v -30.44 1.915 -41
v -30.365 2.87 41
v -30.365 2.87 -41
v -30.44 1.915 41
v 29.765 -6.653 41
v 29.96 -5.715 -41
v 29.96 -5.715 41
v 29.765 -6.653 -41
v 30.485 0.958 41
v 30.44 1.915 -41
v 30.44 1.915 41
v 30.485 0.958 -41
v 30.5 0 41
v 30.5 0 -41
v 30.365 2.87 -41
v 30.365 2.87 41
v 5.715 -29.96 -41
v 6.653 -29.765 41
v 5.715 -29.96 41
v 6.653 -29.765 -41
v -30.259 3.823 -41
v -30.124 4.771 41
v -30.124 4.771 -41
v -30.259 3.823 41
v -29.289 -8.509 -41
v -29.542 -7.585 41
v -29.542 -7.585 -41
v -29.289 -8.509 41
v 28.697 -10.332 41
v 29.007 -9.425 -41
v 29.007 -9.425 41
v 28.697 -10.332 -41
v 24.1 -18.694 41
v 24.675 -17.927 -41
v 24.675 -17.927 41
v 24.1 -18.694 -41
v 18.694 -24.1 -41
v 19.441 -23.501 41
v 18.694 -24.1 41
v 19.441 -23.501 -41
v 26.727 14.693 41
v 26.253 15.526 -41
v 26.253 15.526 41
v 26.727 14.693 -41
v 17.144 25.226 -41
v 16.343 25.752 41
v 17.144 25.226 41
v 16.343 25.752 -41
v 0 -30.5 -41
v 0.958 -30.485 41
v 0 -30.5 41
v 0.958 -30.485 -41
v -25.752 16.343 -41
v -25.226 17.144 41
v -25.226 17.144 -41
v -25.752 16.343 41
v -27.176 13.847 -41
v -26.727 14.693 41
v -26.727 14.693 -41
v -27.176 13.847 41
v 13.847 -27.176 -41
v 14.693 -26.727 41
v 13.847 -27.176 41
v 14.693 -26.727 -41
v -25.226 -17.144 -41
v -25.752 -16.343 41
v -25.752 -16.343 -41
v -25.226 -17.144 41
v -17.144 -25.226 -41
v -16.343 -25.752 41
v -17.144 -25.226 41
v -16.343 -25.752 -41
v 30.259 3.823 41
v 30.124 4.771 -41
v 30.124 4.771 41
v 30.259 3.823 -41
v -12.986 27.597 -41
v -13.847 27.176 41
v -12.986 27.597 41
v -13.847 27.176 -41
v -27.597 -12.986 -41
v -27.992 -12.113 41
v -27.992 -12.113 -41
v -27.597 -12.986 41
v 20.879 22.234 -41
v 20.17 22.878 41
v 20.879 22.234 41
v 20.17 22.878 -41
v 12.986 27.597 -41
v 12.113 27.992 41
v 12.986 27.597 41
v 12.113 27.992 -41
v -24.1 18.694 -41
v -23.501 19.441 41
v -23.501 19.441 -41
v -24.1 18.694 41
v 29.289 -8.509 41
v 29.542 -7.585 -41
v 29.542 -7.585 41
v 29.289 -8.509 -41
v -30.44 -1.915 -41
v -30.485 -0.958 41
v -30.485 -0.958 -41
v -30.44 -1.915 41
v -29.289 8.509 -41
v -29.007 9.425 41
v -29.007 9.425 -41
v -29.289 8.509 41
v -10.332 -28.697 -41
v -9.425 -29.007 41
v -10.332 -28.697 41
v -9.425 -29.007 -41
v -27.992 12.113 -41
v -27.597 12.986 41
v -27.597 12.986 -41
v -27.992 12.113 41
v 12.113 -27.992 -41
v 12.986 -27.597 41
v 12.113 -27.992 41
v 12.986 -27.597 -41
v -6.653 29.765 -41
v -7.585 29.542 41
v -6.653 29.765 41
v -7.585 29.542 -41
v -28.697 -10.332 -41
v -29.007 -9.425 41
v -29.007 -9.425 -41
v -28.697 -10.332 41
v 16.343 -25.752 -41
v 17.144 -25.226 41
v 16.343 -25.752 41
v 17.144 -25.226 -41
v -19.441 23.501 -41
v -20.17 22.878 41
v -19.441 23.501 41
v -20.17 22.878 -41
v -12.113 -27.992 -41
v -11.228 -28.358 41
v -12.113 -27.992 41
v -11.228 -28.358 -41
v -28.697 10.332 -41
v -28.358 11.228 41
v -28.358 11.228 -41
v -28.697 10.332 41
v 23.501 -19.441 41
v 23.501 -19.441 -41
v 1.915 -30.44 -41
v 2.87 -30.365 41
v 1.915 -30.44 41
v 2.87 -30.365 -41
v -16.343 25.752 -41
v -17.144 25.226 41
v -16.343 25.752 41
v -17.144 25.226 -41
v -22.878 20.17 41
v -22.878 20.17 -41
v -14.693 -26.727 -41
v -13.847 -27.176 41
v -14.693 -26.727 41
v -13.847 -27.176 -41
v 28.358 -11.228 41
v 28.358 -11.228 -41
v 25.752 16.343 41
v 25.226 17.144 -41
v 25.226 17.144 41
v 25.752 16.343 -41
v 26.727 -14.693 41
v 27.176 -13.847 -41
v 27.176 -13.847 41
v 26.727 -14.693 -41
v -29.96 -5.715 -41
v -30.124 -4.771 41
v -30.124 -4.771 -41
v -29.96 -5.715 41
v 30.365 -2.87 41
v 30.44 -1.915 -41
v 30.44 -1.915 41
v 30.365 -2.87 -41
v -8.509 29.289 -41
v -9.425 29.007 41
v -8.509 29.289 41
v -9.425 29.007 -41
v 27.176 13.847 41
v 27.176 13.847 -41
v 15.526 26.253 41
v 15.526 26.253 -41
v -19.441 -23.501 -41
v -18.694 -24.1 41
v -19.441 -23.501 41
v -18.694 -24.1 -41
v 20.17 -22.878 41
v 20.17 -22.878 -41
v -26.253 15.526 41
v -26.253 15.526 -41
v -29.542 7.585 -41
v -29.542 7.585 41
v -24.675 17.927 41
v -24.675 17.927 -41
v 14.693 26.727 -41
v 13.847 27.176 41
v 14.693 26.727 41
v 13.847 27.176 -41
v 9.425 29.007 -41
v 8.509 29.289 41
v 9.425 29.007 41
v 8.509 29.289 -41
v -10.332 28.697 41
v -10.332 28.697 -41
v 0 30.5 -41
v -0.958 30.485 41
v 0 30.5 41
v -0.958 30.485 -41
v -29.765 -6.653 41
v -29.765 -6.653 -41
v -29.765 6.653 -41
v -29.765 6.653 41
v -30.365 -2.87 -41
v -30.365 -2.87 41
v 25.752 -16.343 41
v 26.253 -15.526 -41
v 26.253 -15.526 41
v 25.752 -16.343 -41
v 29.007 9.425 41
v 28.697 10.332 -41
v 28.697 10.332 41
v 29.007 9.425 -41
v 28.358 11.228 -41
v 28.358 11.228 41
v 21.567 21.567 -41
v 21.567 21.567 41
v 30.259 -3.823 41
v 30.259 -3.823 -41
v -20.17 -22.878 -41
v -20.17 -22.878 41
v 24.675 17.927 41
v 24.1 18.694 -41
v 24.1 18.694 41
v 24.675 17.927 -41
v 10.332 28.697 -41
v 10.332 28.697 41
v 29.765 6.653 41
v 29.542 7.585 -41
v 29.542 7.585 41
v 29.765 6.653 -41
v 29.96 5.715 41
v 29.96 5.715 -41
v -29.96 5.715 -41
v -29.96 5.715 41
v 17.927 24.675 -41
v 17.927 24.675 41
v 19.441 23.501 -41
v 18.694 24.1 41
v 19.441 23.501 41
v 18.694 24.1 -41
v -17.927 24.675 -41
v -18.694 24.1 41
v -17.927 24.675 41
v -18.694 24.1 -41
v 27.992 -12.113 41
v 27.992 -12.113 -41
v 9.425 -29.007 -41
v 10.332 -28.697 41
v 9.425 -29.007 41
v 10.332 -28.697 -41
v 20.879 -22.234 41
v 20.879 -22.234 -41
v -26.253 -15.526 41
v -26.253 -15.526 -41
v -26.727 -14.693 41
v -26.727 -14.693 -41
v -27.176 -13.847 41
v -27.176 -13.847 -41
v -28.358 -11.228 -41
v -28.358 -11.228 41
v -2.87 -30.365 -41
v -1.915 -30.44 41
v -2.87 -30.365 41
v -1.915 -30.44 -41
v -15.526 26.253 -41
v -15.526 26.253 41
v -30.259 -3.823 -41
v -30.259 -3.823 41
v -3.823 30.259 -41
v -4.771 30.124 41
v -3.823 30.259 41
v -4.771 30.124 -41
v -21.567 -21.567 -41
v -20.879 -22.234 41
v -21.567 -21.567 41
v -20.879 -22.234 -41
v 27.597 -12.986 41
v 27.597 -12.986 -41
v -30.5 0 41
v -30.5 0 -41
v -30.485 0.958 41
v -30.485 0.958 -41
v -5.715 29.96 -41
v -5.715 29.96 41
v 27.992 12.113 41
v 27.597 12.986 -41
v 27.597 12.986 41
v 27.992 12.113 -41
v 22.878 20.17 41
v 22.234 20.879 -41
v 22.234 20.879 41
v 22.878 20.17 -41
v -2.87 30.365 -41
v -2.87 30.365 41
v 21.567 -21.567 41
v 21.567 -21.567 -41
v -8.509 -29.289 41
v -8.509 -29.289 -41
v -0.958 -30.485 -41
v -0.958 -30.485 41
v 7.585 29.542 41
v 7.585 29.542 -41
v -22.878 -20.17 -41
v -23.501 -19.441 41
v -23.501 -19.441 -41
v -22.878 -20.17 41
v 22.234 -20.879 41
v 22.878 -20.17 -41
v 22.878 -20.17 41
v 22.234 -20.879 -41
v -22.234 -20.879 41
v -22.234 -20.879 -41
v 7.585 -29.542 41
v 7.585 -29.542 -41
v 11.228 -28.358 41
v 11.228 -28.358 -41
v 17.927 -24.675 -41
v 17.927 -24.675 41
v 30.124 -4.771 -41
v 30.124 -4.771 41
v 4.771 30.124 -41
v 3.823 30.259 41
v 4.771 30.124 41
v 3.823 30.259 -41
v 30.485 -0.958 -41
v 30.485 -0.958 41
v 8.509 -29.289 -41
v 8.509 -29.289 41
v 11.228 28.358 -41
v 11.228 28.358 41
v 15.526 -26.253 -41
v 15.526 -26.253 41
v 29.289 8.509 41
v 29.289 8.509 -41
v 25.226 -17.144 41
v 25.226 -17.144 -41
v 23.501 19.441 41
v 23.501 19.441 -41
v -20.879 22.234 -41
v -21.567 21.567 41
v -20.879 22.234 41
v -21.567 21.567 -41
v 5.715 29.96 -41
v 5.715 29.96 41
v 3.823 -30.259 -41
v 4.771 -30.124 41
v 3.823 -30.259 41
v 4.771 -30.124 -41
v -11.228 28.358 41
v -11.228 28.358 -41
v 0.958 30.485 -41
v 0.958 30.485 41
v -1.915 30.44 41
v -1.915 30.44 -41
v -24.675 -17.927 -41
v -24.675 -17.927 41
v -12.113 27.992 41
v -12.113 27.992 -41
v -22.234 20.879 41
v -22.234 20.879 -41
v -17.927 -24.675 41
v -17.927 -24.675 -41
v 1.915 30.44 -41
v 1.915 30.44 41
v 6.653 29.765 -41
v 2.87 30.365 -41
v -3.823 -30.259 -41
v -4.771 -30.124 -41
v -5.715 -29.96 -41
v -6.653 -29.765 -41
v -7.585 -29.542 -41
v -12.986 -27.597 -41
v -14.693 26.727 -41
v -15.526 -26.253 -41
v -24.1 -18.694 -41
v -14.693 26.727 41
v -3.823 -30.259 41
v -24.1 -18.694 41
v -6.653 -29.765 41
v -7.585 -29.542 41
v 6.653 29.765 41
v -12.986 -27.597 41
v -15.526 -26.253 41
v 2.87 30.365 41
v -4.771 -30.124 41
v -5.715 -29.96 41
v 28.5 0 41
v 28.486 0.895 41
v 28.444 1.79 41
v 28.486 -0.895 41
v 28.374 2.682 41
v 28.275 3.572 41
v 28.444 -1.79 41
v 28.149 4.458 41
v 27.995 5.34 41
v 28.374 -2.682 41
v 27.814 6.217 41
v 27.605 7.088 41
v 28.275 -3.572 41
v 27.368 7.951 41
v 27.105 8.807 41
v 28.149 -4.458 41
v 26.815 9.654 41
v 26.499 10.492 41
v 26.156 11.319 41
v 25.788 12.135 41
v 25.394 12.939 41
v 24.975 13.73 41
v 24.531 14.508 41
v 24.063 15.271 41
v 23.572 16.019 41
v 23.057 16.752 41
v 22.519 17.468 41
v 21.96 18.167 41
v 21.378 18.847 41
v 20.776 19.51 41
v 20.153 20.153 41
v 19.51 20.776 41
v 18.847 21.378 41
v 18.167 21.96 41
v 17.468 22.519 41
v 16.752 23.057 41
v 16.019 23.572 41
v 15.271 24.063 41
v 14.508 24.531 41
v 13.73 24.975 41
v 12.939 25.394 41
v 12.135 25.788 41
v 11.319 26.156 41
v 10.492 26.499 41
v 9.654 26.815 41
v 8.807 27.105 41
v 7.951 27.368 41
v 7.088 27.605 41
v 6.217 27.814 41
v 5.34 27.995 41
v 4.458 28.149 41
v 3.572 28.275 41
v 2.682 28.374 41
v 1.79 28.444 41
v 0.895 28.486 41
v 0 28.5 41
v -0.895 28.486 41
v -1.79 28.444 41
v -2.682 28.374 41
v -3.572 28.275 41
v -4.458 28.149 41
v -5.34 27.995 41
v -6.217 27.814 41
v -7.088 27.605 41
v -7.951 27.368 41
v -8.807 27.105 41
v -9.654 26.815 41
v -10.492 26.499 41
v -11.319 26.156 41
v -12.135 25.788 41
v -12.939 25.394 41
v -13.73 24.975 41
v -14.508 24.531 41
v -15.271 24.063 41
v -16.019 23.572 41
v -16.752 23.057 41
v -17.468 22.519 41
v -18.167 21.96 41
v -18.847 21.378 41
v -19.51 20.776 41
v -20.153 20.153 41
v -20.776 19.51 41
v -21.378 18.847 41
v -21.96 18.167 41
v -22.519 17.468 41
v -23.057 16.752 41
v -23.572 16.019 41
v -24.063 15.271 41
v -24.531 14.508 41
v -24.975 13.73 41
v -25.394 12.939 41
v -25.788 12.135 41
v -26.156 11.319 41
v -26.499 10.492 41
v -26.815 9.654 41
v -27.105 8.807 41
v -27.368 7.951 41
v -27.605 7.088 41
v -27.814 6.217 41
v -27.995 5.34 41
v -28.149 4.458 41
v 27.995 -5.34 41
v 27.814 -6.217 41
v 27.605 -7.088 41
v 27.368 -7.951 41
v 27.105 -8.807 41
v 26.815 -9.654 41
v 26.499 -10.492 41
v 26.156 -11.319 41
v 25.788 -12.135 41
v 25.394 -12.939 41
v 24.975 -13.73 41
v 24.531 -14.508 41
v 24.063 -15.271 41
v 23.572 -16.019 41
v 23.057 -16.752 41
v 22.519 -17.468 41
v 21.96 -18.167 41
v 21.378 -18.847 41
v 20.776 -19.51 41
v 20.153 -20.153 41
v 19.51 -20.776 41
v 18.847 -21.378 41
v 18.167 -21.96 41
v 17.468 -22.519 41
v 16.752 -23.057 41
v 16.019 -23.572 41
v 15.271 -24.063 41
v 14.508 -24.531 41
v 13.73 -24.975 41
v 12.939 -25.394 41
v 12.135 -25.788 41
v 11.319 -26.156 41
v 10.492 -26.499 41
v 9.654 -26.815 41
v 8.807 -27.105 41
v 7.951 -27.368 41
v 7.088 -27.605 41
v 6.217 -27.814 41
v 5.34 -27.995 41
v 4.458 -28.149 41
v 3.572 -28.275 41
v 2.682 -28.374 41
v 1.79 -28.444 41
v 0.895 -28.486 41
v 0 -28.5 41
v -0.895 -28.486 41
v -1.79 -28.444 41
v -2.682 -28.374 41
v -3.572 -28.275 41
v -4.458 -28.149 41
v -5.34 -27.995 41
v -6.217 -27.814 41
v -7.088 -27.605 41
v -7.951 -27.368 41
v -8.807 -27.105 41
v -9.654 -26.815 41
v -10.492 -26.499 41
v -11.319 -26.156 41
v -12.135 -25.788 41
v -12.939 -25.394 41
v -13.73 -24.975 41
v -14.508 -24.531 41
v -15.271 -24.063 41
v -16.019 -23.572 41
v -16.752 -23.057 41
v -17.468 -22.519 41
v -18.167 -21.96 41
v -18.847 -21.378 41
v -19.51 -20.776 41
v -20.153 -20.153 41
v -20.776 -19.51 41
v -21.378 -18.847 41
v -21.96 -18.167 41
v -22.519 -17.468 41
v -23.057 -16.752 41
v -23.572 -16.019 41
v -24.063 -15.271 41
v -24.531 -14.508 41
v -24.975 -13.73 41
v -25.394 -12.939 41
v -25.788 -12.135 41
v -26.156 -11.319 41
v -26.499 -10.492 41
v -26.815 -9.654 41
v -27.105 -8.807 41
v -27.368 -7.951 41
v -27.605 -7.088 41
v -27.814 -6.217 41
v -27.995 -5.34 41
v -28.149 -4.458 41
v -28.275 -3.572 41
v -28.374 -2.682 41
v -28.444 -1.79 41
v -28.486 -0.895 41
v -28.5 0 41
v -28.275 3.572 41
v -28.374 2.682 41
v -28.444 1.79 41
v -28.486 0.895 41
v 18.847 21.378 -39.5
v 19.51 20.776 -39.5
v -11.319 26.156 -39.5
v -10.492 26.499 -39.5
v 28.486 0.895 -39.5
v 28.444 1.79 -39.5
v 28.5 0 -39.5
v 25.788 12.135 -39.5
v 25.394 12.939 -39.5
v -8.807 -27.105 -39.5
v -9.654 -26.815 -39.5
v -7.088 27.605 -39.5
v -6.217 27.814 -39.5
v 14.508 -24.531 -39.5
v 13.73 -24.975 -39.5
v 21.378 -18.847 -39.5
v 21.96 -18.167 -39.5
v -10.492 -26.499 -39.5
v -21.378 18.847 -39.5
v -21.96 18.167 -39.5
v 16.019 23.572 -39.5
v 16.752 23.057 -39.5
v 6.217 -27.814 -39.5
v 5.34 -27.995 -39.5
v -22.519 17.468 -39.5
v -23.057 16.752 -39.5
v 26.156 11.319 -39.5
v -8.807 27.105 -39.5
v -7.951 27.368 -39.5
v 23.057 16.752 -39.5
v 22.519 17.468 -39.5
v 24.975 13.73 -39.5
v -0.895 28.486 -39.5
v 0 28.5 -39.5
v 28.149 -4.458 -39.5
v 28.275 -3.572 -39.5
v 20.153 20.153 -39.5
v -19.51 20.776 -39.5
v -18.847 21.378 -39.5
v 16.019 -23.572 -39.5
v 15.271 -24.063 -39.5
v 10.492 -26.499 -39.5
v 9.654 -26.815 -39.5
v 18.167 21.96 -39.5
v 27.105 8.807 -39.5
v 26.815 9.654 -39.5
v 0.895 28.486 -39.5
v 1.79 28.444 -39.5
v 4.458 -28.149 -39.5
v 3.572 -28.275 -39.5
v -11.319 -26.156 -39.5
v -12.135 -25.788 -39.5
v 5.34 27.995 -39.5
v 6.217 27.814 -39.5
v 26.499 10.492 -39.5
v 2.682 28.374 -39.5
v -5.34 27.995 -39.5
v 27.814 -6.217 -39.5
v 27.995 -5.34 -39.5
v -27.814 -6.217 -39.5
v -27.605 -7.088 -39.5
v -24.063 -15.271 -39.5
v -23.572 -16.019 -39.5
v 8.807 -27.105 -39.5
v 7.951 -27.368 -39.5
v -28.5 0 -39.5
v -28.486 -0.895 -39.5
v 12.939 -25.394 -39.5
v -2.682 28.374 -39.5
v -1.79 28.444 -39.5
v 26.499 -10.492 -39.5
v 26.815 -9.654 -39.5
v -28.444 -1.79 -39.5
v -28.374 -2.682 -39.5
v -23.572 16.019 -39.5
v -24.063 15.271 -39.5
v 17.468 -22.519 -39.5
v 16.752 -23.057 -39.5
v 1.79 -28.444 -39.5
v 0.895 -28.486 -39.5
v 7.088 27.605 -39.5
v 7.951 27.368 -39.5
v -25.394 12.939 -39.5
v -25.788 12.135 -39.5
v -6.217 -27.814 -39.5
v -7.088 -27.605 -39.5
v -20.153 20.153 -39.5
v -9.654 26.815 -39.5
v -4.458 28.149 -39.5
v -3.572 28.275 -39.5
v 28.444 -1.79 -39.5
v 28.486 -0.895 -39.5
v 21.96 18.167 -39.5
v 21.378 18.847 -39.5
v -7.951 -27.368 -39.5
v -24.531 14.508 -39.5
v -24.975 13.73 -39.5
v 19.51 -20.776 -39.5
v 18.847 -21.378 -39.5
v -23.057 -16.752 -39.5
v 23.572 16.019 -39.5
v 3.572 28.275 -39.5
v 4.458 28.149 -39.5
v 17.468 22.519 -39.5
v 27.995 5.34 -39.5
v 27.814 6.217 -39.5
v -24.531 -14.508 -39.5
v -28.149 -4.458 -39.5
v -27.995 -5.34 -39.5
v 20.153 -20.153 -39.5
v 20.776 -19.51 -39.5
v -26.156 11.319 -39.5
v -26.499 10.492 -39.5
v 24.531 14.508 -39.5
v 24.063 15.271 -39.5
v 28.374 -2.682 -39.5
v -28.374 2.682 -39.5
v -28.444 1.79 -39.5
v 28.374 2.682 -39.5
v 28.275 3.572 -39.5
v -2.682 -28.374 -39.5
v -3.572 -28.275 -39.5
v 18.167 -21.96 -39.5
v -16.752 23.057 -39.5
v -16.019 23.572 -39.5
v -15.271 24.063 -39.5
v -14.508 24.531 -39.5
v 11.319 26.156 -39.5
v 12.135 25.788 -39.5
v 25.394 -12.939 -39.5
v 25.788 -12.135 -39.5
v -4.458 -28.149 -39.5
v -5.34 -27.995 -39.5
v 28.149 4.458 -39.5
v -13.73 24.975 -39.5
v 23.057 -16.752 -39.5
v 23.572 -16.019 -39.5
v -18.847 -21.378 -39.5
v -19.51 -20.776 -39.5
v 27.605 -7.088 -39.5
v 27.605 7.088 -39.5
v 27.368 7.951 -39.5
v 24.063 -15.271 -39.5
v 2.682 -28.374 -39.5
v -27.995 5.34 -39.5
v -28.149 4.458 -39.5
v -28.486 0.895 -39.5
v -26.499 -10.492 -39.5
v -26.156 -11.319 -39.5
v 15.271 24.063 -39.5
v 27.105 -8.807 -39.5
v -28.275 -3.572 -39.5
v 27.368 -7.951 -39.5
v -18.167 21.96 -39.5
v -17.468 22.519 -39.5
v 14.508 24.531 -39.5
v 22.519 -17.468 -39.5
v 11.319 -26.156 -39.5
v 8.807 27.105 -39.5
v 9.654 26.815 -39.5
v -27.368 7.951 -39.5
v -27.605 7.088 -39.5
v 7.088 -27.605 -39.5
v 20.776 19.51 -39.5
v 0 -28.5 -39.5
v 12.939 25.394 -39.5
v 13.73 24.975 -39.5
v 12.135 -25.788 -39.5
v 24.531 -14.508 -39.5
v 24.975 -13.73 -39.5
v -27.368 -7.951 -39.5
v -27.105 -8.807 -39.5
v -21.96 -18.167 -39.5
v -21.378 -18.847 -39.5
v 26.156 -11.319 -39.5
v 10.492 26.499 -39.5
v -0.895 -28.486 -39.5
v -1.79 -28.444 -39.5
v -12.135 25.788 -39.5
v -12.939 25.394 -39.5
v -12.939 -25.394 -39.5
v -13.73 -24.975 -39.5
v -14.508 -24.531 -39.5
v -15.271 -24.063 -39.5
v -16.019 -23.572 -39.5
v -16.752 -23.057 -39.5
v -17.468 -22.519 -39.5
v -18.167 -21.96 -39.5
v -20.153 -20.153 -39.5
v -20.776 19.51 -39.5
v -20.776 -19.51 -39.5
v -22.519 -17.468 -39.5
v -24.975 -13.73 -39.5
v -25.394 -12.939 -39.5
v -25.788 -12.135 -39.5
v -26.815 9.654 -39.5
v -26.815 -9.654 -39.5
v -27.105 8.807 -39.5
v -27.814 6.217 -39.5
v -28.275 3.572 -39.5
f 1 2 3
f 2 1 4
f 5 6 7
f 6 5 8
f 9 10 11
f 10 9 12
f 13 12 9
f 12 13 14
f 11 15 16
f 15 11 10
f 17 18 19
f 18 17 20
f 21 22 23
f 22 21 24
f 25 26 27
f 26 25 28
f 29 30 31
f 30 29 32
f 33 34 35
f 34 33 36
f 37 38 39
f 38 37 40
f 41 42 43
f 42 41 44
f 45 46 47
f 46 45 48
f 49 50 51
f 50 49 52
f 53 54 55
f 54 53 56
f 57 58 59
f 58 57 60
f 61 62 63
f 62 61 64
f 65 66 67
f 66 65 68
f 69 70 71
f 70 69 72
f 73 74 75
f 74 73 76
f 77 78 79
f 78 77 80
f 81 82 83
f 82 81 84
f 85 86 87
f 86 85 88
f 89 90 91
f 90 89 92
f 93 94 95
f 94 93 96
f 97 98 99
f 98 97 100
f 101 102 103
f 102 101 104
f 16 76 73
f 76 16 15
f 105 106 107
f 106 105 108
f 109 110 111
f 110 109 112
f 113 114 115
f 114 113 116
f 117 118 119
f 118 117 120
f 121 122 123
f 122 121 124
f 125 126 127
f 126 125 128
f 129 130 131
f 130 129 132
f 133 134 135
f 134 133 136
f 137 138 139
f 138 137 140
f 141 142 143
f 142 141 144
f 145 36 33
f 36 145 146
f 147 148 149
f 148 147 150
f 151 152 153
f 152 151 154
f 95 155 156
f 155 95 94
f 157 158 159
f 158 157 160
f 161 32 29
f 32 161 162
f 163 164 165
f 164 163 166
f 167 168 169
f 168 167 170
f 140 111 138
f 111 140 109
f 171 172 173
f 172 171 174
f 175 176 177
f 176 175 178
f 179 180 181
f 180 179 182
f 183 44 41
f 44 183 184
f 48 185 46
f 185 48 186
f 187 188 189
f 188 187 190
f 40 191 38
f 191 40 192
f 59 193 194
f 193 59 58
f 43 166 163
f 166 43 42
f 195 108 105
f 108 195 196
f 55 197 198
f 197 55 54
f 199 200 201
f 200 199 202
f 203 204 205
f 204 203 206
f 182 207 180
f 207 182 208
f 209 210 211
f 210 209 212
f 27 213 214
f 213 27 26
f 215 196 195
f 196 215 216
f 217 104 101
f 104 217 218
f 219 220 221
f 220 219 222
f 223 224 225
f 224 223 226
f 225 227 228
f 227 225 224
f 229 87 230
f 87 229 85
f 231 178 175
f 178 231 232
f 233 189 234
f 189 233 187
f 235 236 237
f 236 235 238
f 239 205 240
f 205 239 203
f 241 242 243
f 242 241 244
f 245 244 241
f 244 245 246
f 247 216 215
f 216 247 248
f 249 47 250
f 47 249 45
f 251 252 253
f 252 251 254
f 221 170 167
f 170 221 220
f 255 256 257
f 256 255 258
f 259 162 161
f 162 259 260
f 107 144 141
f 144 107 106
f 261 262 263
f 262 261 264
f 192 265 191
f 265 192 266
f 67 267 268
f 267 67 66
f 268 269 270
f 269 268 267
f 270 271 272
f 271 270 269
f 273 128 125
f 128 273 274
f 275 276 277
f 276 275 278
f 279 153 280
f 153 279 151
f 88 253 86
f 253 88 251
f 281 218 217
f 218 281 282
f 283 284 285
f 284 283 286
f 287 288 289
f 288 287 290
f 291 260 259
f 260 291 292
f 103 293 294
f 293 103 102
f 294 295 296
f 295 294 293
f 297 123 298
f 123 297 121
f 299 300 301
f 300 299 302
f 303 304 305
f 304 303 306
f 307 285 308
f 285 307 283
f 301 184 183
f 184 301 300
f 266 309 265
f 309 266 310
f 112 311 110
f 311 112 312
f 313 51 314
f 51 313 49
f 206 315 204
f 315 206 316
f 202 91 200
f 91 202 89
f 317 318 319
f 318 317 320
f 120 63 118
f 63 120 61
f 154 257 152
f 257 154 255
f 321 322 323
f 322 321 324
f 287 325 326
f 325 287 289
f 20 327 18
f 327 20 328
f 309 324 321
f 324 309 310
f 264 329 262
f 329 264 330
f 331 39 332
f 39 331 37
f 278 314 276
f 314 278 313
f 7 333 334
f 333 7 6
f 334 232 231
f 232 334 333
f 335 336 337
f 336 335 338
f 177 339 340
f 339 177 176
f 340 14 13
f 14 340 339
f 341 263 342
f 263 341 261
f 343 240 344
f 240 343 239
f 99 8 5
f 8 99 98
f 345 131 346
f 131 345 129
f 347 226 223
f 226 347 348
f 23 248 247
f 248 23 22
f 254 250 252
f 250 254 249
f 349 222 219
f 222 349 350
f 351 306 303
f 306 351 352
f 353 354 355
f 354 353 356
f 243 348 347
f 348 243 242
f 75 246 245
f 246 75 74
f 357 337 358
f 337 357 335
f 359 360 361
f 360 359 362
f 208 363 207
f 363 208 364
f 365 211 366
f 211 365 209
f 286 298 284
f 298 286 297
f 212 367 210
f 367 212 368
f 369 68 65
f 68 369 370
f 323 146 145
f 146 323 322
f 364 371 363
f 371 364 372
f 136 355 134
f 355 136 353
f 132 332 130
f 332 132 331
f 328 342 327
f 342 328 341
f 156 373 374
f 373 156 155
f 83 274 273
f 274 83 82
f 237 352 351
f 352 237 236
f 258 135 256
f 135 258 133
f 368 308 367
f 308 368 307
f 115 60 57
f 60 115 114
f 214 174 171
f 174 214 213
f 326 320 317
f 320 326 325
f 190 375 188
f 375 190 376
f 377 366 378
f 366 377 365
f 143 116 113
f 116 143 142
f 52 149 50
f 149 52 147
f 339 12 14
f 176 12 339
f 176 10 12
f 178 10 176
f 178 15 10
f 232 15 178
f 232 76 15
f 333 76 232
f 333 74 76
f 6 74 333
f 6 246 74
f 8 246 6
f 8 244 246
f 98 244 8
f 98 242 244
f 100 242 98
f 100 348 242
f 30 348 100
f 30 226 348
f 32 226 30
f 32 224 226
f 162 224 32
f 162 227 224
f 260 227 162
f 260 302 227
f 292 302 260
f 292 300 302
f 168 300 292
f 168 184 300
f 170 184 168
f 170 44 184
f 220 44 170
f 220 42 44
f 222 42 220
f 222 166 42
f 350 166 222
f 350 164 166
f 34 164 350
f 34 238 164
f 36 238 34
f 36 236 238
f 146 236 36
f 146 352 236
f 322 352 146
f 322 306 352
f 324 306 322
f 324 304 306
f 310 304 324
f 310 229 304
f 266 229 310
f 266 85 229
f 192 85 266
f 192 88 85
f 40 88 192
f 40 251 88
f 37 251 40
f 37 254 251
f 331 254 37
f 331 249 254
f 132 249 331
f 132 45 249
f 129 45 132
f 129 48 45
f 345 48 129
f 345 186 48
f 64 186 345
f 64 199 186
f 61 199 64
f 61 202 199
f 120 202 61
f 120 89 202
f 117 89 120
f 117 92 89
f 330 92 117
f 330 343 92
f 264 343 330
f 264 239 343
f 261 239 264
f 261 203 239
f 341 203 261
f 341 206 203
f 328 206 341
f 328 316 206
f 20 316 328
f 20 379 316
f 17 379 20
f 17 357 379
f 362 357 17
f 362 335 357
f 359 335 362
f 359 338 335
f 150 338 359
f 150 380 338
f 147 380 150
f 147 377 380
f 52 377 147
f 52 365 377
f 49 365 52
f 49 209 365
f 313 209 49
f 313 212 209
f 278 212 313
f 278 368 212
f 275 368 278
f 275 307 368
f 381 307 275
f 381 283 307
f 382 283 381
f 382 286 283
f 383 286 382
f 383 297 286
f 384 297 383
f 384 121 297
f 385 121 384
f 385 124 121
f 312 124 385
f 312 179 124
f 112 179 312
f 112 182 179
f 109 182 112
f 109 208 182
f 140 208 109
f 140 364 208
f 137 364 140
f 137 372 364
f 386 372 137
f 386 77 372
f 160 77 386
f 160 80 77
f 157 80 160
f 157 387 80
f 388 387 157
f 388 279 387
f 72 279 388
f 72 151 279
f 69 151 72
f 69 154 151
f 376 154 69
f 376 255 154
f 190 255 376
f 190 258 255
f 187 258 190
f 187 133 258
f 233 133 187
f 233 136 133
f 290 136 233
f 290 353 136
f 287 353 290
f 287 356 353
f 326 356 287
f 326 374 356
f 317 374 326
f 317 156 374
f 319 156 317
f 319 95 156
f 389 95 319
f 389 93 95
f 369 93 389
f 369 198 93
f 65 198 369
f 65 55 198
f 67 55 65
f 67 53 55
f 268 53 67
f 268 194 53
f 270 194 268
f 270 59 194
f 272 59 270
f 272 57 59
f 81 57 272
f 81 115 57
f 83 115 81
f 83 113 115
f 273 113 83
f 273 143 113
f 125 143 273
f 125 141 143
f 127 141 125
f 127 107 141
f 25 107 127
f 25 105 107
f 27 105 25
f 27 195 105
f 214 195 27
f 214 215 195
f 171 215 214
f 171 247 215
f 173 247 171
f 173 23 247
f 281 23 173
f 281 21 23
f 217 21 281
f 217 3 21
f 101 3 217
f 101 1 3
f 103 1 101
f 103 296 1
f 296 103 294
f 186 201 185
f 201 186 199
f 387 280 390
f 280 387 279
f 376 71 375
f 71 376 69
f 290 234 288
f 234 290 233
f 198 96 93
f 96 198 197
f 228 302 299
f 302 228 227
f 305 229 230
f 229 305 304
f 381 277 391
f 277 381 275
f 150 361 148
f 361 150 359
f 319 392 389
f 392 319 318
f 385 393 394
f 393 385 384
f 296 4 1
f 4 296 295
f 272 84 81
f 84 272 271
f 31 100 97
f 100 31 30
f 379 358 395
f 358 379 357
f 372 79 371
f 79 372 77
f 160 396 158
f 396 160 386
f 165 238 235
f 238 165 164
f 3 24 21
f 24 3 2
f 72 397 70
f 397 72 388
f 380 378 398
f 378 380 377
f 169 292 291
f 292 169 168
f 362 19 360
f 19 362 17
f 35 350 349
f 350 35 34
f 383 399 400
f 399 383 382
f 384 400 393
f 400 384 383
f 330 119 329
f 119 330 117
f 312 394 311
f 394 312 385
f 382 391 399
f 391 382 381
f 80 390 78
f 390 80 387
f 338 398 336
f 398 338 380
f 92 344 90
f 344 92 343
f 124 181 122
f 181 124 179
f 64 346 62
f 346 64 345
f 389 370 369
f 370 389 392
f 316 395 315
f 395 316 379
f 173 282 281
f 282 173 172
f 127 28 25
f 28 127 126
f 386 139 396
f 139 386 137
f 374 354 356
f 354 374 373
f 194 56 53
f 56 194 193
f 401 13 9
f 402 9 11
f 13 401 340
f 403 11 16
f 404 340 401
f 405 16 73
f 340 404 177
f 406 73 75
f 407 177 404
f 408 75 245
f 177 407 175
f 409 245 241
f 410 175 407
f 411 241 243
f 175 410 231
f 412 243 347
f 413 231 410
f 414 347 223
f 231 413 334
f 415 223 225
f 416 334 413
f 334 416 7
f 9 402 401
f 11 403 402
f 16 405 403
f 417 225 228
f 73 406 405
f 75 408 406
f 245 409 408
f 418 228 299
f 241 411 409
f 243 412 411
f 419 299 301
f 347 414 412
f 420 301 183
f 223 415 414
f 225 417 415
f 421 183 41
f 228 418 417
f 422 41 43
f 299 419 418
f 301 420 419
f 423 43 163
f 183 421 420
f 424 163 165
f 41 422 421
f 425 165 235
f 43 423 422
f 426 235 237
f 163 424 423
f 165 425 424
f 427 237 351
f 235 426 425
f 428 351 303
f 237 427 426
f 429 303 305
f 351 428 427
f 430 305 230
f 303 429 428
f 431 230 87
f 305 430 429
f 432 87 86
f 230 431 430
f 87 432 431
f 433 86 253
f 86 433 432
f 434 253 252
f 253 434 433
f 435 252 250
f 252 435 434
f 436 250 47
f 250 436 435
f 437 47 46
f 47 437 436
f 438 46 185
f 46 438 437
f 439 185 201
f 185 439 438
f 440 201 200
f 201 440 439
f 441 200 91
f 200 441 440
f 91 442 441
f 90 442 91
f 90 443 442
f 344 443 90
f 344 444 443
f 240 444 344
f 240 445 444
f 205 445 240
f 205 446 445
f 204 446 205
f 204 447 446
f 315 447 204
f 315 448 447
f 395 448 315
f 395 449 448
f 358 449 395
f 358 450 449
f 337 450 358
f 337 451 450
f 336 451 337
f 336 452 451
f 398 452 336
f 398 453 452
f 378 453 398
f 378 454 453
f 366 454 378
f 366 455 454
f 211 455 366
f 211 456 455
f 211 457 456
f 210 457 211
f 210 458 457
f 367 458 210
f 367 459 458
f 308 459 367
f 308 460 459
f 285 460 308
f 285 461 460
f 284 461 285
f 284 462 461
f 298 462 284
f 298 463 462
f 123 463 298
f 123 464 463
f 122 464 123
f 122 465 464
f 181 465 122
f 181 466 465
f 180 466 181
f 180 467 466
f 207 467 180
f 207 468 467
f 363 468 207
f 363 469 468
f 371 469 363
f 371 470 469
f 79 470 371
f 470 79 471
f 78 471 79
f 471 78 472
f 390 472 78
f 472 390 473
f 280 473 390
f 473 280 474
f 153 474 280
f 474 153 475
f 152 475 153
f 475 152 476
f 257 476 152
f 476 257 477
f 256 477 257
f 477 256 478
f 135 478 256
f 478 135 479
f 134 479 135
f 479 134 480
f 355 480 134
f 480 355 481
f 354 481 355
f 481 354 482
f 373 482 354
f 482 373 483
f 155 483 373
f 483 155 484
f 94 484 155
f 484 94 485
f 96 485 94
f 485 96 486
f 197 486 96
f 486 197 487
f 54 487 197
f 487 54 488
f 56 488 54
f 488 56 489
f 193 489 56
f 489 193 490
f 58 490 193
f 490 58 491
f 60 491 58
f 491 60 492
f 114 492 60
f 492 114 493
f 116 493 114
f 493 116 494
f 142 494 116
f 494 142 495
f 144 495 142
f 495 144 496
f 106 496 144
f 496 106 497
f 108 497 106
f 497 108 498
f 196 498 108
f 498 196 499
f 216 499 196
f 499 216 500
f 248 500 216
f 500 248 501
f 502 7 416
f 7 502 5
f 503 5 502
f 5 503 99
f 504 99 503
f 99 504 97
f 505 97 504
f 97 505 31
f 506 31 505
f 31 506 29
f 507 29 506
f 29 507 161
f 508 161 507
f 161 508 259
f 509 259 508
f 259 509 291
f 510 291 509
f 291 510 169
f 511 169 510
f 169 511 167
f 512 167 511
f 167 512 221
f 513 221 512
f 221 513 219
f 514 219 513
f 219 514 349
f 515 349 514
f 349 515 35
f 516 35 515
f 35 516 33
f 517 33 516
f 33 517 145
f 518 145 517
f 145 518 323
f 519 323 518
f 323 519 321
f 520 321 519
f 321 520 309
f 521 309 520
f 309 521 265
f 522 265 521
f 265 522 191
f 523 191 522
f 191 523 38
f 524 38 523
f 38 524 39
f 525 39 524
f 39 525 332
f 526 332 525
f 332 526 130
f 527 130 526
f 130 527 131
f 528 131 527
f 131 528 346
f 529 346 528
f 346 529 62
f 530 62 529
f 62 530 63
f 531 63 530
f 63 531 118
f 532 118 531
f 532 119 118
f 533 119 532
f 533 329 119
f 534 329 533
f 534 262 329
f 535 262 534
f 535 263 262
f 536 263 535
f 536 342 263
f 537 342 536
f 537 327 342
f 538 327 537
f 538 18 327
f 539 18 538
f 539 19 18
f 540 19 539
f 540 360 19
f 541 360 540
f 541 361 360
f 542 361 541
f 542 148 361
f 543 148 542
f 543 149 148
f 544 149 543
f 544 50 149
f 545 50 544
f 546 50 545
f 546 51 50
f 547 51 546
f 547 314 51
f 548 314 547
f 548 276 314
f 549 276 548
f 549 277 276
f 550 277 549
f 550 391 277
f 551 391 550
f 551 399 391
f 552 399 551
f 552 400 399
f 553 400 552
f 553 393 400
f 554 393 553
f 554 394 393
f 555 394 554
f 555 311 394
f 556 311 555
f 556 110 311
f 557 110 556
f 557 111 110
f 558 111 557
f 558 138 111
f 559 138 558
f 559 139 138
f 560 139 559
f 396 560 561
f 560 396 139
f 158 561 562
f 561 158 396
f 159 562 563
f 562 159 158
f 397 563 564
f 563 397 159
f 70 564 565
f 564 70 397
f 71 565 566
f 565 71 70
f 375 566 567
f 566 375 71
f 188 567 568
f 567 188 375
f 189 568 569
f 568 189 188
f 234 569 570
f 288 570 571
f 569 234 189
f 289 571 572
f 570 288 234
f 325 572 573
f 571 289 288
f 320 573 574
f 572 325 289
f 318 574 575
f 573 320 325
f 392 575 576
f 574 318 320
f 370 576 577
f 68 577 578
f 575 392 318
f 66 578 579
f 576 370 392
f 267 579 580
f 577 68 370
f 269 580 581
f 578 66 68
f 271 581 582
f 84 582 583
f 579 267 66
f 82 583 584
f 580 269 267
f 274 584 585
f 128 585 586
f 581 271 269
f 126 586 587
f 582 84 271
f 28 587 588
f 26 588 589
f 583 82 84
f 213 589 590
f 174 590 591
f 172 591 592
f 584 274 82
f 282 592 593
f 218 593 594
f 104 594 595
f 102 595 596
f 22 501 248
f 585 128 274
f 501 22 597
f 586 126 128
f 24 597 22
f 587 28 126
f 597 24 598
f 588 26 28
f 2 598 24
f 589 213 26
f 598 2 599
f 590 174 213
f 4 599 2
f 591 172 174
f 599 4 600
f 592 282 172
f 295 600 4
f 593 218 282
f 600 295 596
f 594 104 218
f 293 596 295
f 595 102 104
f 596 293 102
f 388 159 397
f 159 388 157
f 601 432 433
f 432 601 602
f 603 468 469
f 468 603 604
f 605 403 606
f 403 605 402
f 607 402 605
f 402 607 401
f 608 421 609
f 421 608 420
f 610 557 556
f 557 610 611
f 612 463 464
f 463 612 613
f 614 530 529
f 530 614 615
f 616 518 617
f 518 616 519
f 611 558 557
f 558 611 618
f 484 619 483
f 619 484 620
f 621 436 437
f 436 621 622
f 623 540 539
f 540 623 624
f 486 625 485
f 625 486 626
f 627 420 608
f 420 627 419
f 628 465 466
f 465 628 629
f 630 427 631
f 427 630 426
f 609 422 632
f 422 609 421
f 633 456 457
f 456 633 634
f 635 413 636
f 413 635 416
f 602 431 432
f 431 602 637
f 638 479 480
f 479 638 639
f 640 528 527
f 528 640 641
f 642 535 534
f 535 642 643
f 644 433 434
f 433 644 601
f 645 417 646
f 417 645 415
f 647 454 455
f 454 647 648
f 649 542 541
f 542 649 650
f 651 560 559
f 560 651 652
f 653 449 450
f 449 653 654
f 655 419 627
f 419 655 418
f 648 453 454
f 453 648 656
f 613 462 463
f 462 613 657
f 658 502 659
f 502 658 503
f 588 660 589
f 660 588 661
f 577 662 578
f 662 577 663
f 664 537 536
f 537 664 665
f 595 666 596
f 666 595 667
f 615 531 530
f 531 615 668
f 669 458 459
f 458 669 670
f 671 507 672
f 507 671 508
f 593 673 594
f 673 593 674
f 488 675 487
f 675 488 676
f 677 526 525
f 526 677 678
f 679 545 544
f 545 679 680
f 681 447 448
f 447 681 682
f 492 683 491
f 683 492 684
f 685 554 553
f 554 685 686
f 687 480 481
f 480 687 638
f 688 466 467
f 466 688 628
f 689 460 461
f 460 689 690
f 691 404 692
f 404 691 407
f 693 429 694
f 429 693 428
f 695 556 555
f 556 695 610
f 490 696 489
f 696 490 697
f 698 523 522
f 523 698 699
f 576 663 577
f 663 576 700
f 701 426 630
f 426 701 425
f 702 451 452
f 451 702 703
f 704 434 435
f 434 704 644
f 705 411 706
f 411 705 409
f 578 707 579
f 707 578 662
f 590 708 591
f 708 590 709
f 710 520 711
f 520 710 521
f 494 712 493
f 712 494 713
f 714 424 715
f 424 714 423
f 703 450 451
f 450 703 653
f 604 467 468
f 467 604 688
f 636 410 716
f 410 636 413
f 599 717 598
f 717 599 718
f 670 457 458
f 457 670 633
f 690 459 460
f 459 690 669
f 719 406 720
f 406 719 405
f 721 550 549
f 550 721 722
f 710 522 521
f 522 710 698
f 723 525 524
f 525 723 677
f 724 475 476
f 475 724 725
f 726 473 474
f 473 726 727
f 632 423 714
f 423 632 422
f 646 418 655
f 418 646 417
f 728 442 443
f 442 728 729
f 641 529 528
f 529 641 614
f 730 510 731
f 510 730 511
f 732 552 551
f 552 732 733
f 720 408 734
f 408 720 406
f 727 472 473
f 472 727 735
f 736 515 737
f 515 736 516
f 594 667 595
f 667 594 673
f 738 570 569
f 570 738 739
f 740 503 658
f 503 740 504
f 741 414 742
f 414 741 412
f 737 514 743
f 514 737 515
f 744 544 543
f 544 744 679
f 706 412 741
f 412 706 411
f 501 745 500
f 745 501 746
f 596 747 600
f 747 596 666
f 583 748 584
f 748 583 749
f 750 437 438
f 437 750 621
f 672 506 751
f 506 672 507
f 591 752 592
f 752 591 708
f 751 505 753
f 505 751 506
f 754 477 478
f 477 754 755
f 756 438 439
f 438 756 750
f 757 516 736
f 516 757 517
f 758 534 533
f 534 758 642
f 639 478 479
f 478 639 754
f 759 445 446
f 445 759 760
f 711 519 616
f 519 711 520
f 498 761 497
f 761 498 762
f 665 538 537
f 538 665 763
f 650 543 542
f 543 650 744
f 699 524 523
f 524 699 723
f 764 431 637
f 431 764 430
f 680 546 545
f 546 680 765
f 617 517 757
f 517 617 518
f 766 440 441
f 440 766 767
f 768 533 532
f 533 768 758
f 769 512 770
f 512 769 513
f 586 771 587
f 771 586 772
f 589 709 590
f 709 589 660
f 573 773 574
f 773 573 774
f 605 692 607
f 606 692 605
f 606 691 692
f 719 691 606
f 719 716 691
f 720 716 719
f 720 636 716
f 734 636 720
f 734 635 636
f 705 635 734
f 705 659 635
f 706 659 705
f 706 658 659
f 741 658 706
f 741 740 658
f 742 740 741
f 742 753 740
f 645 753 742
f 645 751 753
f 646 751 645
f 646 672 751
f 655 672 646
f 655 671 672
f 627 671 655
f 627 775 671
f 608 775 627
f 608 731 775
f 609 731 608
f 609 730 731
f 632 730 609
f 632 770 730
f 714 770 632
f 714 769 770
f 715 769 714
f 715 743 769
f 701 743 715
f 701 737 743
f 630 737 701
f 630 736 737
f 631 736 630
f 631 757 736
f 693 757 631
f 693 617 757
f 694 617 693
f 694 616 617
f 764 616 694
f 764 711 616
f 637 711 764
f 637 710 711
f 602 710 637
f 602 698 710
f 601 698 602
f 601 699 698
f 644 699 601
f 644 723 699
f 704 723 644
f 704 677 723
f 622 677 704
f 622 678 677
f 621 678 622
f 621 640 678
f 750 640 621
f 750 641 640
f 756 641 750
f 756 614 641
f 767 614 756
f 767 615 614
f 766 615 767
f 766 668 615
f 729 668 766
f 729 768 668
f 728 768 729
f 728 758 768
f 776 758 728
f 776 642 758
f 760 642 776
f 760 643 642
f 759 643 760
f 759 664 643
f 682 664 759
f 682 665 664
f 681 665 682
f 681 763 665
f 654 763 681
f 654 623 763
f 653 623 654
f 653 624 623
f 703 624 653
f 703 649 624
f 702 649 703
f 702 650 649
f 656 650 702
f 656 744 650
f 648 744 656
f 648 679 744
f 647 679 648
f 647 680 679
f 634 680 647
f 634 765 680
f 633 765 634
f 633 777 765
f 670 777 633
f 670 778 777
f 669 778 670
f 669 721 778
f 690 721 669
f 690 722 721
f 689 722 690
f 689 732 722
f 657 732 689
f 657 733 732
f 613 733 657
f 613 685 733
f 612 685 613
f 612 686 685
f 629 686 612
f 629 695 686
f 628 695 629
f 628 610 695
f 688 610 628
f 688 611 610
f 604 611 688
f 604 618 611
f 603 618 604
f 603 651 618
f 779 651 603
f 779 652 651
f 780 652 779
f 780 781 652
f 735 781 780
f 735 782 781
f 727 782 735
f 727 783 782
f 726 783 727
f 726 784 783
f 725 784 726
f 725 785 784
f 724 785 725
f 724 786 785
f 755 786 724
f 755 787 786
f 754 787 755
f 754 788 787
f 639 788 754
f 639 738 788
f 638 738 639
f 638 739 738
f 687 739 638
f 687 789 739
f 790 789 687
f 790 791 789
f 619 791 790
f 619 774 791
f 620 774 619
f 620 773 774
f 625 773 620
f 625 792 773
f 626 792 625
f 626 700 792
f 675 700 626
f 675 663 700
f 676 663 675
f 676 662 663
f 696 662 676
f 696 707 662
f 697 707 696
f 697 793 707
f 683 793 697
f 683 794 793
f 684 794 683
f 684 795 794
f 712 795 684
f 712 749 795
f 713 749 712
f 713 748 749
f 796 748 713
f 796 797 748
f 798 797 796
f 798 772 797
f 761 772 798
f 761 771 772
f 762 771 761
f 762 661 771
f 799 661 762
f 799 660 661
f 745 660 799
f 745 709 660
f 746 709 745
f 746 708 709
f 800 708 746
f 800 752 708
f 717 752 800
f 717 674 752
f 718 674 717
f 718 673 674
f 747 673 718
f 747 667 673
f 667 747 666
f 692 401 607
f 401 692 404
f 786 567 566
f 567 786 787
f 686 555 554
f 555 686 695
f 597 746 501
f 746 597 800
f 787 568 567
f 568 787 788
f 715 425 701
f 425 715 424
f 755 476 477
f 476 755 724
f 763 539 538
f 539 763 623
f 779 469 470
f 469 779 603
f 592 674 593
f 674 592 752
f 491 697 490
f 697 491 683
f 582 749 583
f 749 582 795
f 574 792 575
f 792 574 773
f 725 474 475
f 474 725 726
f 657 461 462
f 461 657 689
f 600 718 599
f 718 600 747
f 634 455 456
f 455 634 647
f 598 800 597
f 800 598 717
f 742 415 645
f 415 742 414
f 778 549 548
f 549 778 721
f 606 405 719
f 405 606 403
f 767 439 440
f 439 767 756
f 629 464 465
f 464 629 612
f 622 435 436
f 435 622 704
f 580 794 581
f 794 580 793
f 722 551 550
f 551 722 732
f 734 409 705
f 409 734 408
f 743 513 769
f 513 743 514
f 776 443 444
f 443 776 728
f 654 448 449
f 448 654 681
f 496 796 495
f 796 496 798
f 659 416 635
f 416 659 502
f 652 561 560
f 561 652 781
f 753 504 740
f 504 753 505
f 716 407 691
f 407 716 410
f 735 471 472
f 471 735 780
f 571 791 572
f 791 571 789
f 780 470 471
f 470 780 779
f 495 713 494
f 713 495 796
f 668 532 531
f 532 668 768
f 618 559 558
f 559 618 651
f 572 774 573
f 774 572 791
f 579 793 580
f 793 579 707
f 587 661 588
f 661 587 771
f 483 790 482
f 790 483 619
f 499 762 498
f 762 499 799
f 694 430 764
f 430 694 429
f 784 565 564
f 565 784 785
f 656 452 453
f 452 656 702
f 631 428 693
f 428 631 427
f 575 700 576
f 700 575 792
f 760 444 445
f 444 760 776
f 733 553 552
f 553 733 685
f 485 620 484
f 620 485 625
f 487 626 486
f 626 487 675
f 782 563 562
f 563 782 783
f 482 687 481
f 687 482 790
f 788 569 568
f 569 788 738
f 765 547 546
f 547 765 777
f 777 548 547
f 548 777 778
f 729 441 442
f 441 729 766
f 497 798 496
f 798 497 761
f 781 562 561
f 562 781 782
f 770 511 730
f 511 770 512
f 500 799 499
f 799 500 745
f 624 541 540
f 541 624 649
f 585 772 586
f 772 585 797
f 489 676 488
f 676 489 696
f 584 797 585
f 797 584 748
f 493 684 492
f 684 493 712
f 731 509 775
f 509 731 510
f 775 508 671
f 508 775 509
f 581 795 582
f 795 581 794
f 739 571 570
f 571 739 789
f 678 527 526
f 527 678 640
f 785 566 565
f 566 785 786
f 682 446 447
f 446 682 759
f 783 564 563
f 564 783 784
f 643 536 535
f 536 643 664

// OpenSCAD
module outer(){
    cylinder(82,30.5,30.5,center=true,$fn=200);}

module inner(){
    translate([0,0,1])
    cylinder(81,28.5,28.5,center=true,$fn=200);}

module diff()
difference(){outer();inner();}
diff();
